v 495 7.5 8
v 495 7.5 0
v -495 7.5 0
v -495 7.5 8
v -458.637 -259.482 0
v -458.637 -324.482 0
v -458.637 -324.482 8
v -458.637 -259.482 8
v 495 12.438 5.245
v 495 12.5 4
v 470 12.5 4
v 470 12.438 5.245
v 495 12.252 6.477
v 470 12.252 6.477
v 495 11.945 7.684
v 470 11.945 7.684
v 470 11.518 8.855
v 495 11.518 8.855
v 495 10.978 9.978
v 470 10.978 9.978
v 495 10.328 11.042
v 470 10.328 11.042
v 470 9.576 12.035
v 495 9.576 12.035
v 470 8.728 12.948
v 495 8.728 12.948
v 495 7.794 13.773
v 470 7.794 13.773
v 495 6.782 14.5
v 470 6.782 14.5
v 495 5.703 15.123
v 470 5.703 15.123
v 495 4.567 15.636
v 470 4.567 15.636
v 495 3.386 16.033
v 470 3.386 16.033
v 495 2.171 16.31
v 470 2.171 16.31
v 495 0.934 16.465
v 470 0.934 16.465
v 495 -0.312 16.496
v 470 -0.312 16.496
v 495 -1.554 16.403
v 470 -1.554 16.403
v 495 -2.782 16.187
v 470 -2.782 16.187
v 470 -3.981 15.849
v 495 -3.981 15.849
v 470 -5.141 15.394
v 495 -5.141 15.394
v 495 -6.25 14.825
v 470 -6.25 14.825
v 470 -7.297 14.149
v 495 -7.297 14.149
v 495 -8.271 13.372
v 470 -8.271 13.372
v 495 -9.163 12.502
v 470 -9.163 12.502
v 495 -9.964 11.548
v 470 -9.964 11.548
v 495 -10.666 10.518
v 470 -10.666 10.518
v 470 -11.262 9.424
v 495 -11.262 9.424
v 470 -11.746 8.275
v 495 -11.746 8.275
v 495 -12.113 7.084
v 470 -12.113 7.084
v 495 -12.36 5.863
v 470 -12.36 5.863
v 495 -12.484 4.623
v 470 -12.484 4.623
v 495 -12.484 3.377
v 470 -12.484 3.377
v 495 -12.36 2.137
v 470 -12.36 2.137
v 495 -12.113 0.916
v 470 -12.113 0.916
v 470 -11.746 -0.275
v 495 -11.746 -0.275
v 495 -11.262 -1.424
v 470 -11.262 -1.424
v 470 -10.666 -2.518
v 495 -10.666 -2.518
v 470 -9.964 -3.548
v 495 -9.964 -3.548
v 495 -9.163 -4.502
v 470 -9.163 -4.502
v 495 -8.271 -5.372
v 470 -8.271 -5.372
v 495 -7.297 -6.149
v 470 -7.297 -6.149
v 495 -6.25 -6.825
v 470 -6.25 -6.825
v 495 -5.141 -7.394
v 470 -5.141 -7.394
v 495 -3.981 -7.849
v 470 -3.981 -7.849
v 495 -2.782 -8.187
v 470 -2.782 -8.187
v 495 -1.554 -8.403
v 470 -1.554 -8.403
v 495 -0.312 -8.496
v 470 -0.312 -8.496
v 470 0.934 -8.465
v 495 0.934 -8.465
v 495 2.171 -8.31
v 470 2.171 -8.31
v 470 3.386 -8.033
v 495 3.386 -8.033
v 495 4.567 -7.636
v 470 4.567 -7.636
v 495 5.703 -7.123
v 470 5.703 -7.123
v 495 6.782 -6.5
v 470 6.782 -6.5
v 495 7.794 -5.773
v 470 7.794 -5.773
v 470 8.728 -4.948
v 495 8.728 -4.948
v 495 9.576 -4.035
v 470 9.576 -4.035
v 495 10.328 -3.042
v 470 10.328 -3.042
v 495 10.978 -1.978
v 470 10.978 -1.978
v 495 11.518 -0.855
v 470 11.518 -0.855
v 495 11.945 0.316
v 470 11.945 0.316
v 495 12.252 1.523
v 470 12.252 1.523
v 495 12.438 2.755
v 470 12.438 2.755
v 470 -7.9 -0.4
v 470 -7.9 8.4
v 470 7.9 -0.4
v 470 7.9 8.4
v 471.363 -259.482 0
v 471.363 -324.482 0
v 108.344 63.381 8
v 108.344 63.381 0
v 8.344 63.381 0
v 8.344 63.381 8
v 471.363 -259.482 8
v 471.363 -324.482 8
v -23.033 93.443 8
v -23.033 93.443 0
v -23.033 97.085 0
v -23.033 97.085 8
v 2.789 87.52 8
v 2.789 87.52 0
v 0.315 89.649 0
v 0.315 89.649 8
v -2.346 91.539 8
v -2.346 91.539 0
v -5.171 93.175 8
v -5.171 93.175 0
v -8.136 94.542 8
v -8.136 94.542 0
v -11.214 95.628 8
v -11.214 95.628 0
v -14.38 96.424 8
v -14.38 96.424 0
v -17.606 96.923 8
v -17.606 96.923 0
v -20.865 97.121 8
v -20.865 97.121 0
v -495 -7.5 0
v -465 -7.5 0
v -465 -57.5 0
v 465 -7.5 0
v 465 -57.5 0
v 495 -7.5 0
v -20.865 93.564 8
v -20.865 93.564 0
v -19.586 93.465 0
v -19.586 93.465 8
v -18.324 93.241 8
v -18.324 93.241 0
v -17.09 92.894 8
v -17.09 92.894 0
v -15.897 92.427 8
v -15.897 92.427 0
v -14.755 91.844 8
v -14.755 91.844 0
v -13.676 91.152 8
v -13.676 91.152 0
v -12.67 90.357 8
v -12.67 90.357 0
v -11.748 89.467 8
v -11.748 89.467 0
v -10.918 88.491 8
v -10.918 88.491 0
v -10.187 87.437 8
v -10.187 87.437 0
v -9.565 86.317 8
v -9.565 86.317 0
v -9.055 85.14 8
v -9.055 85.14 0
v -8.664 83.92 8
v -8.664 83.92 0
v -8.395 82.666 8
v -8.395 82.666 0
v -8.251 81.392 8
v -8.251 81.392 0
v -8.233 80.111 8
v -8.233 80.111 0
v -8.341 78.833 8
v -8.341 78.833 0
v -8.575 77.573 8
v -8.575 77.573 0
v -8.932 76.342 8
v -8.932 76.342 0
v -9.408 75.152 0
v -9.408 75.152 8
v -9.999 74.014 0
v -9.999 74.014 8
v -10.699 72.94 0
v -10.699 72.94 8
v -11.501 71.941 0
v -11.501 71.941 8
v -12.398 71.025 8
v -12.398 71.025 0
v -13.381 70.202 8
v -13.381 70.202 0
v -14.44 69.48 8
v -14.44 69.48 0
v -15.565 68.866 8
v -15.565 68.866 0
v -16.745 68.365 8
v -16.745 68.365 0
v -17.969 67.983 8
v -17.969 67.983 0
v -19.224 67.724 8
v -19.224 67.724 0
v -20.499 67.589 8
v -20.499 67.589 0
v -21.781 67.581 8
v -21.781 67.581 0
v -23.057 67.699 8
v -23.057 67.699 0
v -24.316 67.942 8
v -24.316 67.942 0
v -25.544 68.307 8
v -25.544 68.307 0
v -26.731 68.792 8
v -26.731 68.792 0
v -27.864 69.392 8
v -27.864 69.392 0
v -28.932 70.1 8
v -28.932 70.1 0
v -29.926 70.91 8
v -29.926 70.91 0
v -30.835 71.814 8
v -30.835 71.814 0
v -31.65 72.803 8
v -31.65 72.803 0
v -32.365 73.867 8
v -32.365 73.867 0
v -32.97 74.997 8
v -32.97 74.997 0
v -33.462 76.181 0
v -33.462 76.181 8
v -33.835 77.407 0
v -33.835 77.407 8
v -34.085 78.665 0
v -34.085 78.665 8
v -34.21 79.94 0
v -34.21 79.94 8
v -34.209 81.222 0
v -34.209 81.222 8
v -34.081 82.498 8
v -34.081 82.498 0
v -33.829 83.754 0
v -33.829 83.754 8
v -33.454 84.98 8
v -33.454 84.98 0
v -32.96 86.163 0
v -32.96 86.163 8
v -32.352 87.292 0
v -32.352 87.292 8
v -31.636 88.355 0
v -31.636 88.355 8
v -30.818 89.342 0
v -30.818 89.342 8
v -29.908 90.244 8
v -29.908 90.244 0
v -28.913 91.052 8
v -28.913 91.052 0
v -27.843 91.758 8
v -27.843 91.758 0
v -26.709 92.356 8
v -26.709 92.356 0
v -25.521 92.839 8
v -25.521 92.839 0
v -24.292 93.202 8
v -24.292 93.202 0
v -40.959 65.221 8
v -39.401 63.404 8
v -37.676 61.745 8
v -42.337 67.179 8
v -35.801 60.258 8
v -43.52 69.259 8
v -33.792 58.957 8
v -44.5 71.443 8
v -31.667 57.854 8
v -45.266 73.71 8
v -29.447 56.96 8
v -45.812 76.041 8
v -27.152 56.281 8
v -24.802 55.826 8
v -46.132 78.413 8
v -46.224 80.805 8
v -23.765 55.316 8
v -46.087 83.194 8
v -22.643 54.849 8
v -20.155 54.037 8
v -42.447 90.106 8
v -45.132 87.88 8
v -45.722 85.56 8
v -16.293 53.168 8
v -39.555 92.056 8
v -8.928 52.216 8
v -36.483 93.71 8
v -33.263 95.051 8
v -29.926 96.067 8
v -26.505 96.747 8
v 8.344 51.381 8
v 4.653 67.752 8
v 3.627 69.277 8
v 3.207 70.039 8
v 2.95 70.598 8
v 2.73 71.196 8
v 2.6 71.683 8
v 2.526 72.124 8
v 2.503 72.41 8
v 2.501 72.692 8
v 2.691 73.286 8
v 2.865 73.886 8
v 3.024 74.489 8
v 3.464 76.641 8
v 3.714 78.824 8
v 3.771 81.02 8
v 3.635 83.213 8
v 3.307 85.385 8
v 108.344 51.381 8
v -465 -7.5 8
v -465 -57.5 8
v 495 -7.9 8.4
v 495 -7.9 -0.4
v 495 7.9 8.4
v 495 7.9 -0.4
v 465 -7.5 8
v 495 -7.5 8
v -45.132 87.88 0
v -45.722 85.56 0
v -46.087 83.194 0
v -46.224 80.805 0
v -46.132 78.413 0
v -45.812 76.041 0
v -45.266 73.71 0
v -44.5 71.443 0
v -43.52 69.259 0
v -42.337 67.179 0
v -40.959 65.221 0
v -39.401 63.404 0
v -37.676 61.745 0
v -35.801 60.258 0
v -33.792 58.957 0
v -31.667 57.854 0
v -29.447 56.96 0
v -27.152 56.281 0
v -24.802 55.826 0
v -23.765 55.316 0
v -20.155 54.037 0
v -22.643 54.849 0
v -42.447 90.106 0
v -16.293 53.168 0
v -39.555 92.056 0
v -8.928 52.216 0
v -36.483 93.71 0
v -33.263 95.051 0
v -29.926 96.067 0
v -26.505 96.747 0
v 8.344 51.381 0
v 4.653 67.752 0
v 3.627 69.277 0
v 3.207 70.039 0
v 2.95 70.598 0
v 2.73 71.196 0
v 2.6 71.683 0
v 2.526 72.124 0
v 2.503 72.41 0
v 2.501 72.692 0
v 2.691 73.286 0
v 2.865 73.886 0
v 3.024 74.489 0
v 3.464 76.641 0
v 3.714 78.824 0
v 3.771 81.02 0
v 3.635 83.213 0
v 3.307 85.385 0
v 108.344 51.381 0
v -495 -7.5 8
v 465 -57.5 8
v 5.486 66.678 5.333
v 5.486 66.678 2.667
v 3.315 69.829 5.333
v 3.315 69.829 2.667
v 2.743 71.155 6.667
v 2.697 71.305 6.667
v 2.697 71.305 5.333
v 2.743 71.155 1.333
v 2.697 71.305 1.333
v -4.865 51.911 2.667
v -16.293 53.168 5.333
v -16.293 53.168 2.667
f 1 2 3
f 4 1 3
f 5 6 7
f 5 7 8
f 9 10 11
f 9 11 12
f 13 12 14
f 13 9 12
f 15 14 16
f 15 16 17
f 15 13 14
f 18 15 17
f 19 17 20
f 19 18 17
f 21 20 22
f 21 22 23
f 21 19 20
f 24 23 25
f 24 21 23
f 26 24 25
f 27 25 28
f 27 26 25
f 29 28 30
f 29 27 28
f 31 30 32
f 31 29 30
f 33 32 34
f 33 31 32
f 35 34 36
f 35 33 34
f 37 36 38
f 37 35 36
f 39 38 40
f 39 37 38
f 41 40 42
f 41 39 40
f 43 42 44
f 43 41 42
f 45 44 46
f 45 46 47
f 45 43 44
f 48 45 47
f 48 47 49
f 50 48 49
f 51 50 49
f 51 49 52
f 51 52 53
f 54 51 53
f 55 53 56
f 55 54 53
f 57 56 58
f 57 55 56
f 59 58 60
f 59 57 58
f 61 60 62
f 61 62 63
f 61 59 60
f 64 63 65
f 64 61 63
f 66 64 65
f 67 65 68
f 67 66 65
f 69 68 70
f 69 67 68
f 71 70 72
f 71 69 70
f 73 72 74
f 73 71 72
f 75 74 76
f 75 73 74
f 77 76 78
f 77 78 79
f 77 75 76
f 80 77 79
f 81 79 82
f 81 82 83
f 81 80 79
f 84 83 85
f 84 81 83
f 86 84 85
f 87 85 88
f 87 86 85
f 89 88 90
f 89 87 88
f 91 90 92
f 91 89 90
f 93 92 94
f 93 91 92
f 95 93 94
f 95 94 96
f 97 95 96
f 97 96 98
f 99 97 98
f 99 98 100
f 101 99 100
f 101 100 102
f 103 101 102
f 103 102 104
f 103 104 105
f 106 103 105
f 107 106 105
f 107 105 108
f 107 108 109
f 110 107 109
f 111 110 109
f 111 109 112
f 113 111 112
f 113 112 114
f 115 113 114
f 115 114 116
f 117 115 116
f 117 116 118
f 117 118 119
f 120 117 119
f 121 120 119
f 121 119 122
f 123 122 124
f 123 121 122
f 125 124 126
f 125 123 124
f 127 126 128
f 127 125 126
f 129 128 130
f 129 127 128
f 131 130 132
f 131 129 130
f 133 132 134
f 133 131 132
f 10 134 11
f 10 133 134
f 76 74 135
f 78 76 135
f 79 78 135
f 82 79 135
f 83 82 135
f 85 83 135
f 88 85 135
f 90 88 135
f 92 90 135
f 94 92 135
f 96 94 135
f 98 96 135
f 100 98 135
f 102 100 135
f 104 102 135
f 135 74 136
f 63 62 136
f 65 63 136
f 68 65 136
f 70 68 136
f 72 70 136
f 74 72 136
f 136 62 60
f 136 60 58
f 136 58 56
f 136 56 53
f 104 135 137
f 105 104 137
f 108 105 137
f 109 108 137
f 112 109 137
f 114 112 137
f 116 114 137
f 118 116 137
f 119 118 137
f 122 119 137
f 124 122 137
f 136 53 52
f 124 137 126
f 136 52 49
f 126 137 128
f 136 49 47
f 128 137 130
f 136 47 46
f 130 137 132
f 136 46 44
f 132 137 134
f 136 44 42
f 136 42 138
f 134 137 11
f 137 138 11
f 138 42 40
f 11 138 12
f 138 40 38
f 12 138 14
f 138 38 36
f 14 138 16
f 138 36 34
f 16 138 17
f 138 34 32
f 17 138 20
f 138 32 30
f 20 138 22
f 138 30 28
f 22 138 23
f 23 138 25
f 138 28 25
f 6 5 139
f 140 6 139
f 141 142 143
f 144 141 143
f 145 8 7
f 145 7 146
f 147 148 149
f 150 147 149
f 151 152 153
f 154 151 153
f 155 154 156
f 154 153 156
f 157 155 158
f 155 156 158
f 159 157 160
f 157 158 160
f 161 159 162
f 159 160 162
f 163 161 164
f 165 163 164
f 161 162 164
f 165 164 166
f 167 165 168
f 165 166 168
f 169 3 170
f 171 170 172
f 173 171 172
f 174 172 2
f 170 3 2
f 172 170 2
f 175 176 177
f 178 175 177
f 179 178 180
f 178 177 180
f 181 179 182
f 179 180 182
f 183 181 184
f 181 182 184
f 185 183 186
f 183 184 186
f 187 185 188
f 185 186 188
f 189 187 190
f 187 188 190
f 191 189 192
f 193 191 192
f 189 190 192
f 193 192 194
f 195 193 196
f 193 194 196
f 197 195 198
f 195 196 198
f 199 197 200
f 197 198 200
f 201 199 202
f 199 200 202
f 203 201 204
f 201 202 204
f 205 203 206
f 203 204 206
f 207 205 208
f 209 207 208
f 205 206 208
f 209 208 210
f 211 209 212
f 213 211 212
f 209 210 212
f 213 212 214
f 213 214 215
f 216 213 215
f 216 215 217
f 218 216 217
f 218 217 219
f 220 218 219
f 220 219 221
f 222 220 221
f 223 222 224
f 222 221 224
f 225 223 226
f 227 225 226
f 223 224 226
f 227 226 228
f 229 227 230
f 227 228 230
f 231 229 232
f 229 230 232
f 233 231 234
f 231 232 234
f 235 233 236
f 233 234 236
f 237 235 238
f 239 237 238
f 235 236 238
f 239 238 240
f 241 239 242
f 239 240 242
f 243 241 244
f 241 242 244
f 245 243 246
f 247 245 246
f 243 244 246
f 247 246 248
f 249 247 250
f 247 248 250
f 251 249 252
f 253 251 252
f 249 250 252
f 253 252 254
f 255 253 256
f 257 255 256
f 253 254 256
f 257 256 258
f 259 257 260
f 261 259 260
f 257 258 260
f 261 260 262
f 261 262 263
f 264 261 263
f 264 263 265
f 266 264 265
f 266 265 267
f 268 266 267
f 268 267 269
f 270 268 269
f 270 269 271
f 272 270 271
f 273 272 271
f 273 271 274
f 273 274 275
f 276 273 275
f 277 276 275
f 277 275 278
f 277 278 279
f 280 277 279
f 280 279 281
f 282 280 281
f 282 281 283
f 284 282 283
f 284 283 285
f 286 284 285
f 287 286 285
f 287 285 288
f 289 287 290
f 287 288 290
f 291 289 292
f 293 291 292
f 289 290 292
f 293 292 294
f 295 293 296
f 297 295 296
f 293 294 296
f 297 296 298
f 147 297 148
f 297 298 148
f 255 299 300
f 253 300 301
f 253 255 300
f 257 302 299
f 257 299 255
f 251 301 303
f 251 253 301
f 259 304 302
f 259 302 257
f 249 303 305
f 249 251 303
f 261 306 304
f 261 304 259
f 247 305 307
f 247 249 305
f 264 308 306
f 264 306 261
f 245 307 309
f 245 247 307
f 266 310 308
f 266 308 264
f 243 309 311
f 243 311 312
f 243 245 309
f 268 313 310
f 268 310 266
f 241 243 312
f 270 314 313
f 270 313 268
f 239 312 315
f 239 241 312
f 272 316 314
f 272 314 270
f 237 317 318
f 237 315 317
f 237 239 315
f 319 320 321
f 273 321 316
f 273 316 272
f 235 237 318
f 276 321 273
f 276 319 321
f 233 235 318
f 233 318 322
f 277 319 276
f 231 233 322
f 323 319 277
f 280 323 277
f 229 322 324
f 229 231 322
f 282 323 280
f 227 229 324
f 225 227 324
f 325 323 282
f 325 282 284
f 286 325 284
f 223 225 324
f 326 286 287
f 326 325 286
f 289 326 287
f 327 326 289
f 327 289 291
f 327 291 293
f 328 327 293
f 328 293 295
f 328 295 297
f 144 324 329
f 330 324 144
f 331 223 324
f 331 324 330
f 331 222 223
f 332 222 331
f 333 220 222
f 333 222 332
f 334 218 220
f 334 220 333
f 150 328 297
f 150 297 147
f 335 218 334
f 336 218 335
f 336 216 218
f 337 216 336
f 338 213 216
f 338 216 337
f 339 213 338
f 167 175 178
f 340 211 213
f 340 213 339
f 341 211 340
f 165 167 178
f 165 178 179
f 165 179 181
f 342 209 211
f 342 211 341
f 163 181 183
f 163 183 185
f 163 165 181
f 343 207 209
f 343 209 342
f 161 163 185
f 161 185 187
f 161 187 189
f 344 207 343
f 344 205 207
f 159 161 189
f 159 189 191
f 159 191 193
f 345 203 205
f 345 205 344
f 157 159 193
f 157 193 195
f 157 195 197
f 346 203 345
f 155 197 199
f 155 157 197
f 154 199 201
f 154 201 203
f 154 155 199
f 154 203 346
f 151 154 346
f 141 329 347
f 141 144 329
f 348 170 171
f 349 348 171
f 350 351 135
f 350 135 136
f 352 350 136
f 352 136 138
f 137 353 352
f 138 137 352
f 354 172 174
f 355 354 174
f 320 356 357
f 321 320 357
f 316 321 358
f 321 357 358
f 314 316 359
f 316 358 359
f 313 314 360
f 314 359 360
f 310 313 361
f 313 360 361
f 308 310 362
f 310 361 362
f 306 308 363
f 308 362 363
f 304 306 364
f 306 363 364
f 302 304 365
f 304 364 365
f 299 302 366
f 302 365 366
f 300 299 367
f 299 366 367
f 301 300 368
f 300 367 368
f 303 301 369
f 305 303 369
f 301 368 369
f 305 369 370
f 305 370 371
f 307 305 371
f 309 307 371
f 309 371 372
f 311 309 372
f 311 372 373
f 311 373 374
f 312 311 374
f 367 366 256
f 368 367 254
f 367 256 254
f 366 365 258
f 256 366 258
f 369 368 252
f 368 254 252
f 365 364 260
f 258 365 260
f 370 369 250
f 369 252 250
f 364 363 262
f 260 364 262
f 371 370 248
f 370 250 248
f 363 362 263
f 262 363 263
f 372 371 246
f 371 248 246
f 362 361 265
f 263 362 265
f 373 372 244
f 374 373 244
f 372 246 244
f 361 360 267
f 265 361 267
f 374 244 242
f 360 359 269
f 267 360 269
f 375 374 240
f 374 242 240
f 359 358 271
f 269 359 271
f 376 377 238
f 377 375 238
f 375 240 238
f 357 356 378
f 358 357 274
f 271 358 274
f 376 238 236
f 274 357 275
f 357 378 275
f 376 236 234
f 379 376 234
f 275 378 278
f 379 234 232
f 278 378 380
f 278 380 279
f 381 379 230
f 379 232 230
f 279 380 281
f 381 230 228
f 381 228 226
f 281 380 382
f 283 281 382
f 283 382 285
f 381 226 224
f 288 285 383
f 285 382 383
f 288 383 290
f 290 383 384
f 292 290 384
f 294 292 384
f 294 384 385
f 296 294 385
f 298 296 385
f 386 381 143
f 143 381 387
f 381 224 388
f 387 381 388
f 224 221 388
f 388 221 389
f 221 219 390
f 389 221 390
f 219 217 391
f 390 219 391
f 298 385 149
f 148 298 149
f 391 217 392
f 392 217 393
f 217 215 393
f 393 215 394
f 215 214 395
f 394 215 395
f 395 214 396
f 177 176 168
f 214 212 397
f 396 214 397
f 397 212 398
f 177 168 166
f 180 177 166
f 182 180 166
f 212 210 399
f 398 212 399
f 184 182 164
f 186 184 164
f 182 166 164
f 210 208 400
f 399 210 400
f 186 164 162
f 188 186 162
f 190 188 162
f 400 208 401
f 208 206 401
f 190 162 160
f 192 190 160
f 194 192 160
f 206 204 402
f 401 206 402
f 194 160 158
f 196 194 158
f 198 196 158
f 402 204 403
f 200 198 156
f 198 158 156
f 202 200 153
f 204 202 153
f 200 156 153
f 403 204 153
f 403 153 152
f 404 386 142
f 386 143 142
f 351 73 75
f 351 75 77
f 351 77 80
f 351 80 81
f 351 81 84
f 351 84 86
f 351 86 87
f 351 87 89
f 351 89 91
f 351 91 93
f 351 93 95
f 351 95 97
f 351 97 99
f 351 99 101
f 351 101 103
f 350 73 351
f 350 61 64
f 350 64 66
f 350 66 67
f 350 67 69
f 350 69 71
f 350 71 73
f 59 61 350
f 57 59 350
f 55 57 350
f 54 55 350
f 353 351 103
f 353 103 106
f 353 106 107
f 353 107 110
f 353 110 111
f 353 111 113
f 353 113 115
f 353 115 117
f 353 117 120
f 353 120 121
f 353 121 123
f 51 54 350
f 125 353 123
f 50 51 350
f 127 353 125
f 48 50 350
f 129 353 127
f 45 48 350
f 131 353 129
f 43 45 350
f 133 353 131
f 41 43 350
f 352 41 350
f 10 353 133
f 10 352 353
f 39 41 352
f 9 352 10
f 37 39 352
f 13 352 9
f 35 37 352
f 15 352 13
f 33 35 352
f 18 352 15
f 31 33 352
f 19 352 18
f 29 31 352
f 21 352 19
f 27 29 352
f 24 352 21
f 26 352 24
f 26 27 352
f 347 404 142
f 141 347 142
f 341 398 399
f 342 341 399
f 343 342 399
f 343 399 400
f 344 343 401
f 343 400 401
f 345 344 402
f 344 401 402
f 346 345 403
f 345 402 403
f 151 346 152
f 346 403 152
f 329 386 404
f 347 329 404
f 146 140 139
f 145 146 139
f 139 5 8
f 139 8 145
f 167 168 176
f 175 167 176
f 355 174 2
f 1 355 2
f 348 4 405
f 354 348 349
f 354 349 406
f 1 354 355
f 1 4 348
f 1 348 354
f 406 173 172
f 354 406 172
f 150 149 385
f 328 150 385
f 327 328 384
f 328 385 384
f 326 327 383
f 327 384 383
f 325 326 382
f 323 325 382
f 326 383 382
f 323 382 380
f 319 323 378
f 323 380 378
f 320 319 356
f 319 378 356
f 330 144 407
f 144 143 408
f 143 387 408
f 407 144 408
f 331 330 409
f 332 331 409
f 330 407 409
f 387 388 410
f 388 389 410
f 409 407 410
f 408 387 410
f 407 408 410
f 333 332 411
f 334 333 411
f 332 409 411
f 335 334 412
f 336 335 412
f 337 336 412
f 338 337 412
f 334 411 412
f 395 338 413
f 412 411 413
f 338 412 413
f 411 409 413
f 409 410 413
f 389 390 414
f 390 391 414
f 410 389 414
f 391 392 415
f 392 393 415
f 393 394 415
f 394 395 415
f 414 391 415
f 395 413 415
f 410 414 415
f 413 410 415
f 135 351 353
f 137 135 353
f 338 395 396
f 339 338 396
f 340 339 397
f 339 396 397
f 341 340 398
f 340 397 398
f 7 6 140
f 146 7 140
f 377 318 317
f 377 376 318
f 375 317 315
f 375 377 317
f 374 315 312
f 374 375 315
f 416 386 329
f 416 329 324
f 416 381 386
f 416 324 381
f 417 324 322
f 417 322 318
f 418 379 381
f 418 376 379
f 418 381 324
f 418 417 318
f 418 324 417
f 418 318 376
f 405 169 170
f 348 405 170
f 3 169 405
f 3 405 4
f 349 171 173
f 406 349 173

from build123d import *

# Parameters (mm, degrees)
F0_W     = 30
F0_H     = 15
F1_DEPTH = 8
F0_W_2   = 930
F0_H_2   = 65
F2_R     = 12.5
F2_W     = 15.8
F2_H     = 8.8
F3_DEPTH = 25
F5_DEPTH = 8


with BuildPart() as f1:
    # F0 (on Top) → F1 (new body)
    with BuildSketch(Plane.XY):
        with Locations((480, 0)):
            Rectangle(F0_W, F0_H)
        Polygon((465, -7.5), (465, 7.5), (-465, 7.5), (-465, -7.5), (-465, -57.5), (465, -57.5), align=None)
        with Locations((-480, 0)):
            Rectangle(F0_W, F0_H)
    extrude(amount=F1_DEPTH)


with BuildPart() as f1b:
    # F0 (on Top) → F1, piece 2 (new body)
    with BuildSketch(Plane.XY):
        with Locations((6.3626134396, -291.9821131229)):
            Rectangle(F0_W_2, F0_H_2)
    extrude(amount=F1_DEPTH)


with BuildPart() as f3:
    # F2 (on face) → F3 (new body)
    with BuildSketch(Plane.YZ.offset(495)):
        with Locations((0, 4)):
            Circle(F2_R)
        with Locations((0, 4)):
            Rectangle(F2_W, F2_H, mode=Mode.SUBTRACT)
    extrude(amount=-F3_DEPTH)


with BuildPart() as f5:
    # F4 (on Top) → F5 (new body)
    with BuildSketch(Plane.XY):
        with BuildLine():
            Line((108.3438670263, 51.3812564313), (108.3438670263, 63.3812564313))
            Line((108.3438670263, 63.3812564313), (8.3438670263, 63.3812564313))
            add(Edge.make_bspline(
                [(8.3438670263, 63.3812564313), (5.3670516377, 66.7041790393), (2.4126594236, 70.0207141177), (2.5014199346, 72.6916081624)],
                knots=[0, 0, 0, 0, 0.5599704127, 0.5599704127, 0.5599704127, 0.5599704127], degree=3))
            add(Edge.make_bspline(
                [(2.5014199346, 72.6916081624), (2.5224130391, 73.3233120261), (2.7136366909, 73.9188994552), (3.0243427489, 74.4891023385)],
                knots=[0.5599704127, 0.5599704127, 0.5599704127, 0.5599704127, 0.6924112611, 0.6924112611, 0.6924112611, 0.6924112611], degree=3))
            ThreePointArc((3.0243427489, 74.4891023385), (3.7708143316, 81.0199999582), (2.7891735817, 87.5197095656))
            ThreePointArc((2.7891735817, 87.5197095656), (-8.1359373234, 94.5418353751), (-20.8645367822, 97.1207993121))
            Line((-20.8645367822, 97.1207993121), (-20.8645367822, 93.5638856829))
            ThreePointArc((-20.8645367822, 93.5638856829), (-20.4989886716, 67.5891823606), (-23.0328720233, 93.4425820067))
            Line((-23.0328720233, 93.4425820067), (-23.0328720233, 97.0847913286))
            ThreePointArc((-23.0328720233, 97.0847913286), (-34.8898145719, 94.420179027), (-45.1322930826, 87.8796225313))
            ThreePointArc((-45.1322930826, 87.8796225313), (-42.3366661495, 67.1785019342), (-24.8017338771, 55.8260539988))
            add(Edge.make_bspline(
                [(8.3438670263, 51.3812564313), (-5.3752977401, 51.7728589475), (-18.1325646639, 52.2421691312), (-24.8017338771, 55.8260539988)],
                knots=[0, 0, 0, 0, 0.6343210063, 0.6343210063, 0.6343210063, 0.6343210063], degree=3))
            Line((8.3438670263, 51.3812564313), (108.3438670263, 51.3812564313))
        make_face()
        with BuildLine():
            add(Edge.make_bspline(
                [(2.5014199346, 72.6916081624), (2.5224130391, 73.3233120261), (2.7136366909, 73.9188994552), (3.0243427489, 74.4891023385)],
                knots=[0.5599704127, 0.5599704127, 0.5599704127, 0.5599704127, 0.6924112611, 0.6924112611, 0.6924112611, 0.6924112611], degree=3))
            ThreePointArc((2.5014199346, 72.6916081624), (2.7797119065, 73.5854589418), (3.0243427489, 74.4891023385))
        make_face()
    extrude(amount=F5_DEPTH)


solid = Compound([f1.part, f1b.part, f3.part, f5.part])
